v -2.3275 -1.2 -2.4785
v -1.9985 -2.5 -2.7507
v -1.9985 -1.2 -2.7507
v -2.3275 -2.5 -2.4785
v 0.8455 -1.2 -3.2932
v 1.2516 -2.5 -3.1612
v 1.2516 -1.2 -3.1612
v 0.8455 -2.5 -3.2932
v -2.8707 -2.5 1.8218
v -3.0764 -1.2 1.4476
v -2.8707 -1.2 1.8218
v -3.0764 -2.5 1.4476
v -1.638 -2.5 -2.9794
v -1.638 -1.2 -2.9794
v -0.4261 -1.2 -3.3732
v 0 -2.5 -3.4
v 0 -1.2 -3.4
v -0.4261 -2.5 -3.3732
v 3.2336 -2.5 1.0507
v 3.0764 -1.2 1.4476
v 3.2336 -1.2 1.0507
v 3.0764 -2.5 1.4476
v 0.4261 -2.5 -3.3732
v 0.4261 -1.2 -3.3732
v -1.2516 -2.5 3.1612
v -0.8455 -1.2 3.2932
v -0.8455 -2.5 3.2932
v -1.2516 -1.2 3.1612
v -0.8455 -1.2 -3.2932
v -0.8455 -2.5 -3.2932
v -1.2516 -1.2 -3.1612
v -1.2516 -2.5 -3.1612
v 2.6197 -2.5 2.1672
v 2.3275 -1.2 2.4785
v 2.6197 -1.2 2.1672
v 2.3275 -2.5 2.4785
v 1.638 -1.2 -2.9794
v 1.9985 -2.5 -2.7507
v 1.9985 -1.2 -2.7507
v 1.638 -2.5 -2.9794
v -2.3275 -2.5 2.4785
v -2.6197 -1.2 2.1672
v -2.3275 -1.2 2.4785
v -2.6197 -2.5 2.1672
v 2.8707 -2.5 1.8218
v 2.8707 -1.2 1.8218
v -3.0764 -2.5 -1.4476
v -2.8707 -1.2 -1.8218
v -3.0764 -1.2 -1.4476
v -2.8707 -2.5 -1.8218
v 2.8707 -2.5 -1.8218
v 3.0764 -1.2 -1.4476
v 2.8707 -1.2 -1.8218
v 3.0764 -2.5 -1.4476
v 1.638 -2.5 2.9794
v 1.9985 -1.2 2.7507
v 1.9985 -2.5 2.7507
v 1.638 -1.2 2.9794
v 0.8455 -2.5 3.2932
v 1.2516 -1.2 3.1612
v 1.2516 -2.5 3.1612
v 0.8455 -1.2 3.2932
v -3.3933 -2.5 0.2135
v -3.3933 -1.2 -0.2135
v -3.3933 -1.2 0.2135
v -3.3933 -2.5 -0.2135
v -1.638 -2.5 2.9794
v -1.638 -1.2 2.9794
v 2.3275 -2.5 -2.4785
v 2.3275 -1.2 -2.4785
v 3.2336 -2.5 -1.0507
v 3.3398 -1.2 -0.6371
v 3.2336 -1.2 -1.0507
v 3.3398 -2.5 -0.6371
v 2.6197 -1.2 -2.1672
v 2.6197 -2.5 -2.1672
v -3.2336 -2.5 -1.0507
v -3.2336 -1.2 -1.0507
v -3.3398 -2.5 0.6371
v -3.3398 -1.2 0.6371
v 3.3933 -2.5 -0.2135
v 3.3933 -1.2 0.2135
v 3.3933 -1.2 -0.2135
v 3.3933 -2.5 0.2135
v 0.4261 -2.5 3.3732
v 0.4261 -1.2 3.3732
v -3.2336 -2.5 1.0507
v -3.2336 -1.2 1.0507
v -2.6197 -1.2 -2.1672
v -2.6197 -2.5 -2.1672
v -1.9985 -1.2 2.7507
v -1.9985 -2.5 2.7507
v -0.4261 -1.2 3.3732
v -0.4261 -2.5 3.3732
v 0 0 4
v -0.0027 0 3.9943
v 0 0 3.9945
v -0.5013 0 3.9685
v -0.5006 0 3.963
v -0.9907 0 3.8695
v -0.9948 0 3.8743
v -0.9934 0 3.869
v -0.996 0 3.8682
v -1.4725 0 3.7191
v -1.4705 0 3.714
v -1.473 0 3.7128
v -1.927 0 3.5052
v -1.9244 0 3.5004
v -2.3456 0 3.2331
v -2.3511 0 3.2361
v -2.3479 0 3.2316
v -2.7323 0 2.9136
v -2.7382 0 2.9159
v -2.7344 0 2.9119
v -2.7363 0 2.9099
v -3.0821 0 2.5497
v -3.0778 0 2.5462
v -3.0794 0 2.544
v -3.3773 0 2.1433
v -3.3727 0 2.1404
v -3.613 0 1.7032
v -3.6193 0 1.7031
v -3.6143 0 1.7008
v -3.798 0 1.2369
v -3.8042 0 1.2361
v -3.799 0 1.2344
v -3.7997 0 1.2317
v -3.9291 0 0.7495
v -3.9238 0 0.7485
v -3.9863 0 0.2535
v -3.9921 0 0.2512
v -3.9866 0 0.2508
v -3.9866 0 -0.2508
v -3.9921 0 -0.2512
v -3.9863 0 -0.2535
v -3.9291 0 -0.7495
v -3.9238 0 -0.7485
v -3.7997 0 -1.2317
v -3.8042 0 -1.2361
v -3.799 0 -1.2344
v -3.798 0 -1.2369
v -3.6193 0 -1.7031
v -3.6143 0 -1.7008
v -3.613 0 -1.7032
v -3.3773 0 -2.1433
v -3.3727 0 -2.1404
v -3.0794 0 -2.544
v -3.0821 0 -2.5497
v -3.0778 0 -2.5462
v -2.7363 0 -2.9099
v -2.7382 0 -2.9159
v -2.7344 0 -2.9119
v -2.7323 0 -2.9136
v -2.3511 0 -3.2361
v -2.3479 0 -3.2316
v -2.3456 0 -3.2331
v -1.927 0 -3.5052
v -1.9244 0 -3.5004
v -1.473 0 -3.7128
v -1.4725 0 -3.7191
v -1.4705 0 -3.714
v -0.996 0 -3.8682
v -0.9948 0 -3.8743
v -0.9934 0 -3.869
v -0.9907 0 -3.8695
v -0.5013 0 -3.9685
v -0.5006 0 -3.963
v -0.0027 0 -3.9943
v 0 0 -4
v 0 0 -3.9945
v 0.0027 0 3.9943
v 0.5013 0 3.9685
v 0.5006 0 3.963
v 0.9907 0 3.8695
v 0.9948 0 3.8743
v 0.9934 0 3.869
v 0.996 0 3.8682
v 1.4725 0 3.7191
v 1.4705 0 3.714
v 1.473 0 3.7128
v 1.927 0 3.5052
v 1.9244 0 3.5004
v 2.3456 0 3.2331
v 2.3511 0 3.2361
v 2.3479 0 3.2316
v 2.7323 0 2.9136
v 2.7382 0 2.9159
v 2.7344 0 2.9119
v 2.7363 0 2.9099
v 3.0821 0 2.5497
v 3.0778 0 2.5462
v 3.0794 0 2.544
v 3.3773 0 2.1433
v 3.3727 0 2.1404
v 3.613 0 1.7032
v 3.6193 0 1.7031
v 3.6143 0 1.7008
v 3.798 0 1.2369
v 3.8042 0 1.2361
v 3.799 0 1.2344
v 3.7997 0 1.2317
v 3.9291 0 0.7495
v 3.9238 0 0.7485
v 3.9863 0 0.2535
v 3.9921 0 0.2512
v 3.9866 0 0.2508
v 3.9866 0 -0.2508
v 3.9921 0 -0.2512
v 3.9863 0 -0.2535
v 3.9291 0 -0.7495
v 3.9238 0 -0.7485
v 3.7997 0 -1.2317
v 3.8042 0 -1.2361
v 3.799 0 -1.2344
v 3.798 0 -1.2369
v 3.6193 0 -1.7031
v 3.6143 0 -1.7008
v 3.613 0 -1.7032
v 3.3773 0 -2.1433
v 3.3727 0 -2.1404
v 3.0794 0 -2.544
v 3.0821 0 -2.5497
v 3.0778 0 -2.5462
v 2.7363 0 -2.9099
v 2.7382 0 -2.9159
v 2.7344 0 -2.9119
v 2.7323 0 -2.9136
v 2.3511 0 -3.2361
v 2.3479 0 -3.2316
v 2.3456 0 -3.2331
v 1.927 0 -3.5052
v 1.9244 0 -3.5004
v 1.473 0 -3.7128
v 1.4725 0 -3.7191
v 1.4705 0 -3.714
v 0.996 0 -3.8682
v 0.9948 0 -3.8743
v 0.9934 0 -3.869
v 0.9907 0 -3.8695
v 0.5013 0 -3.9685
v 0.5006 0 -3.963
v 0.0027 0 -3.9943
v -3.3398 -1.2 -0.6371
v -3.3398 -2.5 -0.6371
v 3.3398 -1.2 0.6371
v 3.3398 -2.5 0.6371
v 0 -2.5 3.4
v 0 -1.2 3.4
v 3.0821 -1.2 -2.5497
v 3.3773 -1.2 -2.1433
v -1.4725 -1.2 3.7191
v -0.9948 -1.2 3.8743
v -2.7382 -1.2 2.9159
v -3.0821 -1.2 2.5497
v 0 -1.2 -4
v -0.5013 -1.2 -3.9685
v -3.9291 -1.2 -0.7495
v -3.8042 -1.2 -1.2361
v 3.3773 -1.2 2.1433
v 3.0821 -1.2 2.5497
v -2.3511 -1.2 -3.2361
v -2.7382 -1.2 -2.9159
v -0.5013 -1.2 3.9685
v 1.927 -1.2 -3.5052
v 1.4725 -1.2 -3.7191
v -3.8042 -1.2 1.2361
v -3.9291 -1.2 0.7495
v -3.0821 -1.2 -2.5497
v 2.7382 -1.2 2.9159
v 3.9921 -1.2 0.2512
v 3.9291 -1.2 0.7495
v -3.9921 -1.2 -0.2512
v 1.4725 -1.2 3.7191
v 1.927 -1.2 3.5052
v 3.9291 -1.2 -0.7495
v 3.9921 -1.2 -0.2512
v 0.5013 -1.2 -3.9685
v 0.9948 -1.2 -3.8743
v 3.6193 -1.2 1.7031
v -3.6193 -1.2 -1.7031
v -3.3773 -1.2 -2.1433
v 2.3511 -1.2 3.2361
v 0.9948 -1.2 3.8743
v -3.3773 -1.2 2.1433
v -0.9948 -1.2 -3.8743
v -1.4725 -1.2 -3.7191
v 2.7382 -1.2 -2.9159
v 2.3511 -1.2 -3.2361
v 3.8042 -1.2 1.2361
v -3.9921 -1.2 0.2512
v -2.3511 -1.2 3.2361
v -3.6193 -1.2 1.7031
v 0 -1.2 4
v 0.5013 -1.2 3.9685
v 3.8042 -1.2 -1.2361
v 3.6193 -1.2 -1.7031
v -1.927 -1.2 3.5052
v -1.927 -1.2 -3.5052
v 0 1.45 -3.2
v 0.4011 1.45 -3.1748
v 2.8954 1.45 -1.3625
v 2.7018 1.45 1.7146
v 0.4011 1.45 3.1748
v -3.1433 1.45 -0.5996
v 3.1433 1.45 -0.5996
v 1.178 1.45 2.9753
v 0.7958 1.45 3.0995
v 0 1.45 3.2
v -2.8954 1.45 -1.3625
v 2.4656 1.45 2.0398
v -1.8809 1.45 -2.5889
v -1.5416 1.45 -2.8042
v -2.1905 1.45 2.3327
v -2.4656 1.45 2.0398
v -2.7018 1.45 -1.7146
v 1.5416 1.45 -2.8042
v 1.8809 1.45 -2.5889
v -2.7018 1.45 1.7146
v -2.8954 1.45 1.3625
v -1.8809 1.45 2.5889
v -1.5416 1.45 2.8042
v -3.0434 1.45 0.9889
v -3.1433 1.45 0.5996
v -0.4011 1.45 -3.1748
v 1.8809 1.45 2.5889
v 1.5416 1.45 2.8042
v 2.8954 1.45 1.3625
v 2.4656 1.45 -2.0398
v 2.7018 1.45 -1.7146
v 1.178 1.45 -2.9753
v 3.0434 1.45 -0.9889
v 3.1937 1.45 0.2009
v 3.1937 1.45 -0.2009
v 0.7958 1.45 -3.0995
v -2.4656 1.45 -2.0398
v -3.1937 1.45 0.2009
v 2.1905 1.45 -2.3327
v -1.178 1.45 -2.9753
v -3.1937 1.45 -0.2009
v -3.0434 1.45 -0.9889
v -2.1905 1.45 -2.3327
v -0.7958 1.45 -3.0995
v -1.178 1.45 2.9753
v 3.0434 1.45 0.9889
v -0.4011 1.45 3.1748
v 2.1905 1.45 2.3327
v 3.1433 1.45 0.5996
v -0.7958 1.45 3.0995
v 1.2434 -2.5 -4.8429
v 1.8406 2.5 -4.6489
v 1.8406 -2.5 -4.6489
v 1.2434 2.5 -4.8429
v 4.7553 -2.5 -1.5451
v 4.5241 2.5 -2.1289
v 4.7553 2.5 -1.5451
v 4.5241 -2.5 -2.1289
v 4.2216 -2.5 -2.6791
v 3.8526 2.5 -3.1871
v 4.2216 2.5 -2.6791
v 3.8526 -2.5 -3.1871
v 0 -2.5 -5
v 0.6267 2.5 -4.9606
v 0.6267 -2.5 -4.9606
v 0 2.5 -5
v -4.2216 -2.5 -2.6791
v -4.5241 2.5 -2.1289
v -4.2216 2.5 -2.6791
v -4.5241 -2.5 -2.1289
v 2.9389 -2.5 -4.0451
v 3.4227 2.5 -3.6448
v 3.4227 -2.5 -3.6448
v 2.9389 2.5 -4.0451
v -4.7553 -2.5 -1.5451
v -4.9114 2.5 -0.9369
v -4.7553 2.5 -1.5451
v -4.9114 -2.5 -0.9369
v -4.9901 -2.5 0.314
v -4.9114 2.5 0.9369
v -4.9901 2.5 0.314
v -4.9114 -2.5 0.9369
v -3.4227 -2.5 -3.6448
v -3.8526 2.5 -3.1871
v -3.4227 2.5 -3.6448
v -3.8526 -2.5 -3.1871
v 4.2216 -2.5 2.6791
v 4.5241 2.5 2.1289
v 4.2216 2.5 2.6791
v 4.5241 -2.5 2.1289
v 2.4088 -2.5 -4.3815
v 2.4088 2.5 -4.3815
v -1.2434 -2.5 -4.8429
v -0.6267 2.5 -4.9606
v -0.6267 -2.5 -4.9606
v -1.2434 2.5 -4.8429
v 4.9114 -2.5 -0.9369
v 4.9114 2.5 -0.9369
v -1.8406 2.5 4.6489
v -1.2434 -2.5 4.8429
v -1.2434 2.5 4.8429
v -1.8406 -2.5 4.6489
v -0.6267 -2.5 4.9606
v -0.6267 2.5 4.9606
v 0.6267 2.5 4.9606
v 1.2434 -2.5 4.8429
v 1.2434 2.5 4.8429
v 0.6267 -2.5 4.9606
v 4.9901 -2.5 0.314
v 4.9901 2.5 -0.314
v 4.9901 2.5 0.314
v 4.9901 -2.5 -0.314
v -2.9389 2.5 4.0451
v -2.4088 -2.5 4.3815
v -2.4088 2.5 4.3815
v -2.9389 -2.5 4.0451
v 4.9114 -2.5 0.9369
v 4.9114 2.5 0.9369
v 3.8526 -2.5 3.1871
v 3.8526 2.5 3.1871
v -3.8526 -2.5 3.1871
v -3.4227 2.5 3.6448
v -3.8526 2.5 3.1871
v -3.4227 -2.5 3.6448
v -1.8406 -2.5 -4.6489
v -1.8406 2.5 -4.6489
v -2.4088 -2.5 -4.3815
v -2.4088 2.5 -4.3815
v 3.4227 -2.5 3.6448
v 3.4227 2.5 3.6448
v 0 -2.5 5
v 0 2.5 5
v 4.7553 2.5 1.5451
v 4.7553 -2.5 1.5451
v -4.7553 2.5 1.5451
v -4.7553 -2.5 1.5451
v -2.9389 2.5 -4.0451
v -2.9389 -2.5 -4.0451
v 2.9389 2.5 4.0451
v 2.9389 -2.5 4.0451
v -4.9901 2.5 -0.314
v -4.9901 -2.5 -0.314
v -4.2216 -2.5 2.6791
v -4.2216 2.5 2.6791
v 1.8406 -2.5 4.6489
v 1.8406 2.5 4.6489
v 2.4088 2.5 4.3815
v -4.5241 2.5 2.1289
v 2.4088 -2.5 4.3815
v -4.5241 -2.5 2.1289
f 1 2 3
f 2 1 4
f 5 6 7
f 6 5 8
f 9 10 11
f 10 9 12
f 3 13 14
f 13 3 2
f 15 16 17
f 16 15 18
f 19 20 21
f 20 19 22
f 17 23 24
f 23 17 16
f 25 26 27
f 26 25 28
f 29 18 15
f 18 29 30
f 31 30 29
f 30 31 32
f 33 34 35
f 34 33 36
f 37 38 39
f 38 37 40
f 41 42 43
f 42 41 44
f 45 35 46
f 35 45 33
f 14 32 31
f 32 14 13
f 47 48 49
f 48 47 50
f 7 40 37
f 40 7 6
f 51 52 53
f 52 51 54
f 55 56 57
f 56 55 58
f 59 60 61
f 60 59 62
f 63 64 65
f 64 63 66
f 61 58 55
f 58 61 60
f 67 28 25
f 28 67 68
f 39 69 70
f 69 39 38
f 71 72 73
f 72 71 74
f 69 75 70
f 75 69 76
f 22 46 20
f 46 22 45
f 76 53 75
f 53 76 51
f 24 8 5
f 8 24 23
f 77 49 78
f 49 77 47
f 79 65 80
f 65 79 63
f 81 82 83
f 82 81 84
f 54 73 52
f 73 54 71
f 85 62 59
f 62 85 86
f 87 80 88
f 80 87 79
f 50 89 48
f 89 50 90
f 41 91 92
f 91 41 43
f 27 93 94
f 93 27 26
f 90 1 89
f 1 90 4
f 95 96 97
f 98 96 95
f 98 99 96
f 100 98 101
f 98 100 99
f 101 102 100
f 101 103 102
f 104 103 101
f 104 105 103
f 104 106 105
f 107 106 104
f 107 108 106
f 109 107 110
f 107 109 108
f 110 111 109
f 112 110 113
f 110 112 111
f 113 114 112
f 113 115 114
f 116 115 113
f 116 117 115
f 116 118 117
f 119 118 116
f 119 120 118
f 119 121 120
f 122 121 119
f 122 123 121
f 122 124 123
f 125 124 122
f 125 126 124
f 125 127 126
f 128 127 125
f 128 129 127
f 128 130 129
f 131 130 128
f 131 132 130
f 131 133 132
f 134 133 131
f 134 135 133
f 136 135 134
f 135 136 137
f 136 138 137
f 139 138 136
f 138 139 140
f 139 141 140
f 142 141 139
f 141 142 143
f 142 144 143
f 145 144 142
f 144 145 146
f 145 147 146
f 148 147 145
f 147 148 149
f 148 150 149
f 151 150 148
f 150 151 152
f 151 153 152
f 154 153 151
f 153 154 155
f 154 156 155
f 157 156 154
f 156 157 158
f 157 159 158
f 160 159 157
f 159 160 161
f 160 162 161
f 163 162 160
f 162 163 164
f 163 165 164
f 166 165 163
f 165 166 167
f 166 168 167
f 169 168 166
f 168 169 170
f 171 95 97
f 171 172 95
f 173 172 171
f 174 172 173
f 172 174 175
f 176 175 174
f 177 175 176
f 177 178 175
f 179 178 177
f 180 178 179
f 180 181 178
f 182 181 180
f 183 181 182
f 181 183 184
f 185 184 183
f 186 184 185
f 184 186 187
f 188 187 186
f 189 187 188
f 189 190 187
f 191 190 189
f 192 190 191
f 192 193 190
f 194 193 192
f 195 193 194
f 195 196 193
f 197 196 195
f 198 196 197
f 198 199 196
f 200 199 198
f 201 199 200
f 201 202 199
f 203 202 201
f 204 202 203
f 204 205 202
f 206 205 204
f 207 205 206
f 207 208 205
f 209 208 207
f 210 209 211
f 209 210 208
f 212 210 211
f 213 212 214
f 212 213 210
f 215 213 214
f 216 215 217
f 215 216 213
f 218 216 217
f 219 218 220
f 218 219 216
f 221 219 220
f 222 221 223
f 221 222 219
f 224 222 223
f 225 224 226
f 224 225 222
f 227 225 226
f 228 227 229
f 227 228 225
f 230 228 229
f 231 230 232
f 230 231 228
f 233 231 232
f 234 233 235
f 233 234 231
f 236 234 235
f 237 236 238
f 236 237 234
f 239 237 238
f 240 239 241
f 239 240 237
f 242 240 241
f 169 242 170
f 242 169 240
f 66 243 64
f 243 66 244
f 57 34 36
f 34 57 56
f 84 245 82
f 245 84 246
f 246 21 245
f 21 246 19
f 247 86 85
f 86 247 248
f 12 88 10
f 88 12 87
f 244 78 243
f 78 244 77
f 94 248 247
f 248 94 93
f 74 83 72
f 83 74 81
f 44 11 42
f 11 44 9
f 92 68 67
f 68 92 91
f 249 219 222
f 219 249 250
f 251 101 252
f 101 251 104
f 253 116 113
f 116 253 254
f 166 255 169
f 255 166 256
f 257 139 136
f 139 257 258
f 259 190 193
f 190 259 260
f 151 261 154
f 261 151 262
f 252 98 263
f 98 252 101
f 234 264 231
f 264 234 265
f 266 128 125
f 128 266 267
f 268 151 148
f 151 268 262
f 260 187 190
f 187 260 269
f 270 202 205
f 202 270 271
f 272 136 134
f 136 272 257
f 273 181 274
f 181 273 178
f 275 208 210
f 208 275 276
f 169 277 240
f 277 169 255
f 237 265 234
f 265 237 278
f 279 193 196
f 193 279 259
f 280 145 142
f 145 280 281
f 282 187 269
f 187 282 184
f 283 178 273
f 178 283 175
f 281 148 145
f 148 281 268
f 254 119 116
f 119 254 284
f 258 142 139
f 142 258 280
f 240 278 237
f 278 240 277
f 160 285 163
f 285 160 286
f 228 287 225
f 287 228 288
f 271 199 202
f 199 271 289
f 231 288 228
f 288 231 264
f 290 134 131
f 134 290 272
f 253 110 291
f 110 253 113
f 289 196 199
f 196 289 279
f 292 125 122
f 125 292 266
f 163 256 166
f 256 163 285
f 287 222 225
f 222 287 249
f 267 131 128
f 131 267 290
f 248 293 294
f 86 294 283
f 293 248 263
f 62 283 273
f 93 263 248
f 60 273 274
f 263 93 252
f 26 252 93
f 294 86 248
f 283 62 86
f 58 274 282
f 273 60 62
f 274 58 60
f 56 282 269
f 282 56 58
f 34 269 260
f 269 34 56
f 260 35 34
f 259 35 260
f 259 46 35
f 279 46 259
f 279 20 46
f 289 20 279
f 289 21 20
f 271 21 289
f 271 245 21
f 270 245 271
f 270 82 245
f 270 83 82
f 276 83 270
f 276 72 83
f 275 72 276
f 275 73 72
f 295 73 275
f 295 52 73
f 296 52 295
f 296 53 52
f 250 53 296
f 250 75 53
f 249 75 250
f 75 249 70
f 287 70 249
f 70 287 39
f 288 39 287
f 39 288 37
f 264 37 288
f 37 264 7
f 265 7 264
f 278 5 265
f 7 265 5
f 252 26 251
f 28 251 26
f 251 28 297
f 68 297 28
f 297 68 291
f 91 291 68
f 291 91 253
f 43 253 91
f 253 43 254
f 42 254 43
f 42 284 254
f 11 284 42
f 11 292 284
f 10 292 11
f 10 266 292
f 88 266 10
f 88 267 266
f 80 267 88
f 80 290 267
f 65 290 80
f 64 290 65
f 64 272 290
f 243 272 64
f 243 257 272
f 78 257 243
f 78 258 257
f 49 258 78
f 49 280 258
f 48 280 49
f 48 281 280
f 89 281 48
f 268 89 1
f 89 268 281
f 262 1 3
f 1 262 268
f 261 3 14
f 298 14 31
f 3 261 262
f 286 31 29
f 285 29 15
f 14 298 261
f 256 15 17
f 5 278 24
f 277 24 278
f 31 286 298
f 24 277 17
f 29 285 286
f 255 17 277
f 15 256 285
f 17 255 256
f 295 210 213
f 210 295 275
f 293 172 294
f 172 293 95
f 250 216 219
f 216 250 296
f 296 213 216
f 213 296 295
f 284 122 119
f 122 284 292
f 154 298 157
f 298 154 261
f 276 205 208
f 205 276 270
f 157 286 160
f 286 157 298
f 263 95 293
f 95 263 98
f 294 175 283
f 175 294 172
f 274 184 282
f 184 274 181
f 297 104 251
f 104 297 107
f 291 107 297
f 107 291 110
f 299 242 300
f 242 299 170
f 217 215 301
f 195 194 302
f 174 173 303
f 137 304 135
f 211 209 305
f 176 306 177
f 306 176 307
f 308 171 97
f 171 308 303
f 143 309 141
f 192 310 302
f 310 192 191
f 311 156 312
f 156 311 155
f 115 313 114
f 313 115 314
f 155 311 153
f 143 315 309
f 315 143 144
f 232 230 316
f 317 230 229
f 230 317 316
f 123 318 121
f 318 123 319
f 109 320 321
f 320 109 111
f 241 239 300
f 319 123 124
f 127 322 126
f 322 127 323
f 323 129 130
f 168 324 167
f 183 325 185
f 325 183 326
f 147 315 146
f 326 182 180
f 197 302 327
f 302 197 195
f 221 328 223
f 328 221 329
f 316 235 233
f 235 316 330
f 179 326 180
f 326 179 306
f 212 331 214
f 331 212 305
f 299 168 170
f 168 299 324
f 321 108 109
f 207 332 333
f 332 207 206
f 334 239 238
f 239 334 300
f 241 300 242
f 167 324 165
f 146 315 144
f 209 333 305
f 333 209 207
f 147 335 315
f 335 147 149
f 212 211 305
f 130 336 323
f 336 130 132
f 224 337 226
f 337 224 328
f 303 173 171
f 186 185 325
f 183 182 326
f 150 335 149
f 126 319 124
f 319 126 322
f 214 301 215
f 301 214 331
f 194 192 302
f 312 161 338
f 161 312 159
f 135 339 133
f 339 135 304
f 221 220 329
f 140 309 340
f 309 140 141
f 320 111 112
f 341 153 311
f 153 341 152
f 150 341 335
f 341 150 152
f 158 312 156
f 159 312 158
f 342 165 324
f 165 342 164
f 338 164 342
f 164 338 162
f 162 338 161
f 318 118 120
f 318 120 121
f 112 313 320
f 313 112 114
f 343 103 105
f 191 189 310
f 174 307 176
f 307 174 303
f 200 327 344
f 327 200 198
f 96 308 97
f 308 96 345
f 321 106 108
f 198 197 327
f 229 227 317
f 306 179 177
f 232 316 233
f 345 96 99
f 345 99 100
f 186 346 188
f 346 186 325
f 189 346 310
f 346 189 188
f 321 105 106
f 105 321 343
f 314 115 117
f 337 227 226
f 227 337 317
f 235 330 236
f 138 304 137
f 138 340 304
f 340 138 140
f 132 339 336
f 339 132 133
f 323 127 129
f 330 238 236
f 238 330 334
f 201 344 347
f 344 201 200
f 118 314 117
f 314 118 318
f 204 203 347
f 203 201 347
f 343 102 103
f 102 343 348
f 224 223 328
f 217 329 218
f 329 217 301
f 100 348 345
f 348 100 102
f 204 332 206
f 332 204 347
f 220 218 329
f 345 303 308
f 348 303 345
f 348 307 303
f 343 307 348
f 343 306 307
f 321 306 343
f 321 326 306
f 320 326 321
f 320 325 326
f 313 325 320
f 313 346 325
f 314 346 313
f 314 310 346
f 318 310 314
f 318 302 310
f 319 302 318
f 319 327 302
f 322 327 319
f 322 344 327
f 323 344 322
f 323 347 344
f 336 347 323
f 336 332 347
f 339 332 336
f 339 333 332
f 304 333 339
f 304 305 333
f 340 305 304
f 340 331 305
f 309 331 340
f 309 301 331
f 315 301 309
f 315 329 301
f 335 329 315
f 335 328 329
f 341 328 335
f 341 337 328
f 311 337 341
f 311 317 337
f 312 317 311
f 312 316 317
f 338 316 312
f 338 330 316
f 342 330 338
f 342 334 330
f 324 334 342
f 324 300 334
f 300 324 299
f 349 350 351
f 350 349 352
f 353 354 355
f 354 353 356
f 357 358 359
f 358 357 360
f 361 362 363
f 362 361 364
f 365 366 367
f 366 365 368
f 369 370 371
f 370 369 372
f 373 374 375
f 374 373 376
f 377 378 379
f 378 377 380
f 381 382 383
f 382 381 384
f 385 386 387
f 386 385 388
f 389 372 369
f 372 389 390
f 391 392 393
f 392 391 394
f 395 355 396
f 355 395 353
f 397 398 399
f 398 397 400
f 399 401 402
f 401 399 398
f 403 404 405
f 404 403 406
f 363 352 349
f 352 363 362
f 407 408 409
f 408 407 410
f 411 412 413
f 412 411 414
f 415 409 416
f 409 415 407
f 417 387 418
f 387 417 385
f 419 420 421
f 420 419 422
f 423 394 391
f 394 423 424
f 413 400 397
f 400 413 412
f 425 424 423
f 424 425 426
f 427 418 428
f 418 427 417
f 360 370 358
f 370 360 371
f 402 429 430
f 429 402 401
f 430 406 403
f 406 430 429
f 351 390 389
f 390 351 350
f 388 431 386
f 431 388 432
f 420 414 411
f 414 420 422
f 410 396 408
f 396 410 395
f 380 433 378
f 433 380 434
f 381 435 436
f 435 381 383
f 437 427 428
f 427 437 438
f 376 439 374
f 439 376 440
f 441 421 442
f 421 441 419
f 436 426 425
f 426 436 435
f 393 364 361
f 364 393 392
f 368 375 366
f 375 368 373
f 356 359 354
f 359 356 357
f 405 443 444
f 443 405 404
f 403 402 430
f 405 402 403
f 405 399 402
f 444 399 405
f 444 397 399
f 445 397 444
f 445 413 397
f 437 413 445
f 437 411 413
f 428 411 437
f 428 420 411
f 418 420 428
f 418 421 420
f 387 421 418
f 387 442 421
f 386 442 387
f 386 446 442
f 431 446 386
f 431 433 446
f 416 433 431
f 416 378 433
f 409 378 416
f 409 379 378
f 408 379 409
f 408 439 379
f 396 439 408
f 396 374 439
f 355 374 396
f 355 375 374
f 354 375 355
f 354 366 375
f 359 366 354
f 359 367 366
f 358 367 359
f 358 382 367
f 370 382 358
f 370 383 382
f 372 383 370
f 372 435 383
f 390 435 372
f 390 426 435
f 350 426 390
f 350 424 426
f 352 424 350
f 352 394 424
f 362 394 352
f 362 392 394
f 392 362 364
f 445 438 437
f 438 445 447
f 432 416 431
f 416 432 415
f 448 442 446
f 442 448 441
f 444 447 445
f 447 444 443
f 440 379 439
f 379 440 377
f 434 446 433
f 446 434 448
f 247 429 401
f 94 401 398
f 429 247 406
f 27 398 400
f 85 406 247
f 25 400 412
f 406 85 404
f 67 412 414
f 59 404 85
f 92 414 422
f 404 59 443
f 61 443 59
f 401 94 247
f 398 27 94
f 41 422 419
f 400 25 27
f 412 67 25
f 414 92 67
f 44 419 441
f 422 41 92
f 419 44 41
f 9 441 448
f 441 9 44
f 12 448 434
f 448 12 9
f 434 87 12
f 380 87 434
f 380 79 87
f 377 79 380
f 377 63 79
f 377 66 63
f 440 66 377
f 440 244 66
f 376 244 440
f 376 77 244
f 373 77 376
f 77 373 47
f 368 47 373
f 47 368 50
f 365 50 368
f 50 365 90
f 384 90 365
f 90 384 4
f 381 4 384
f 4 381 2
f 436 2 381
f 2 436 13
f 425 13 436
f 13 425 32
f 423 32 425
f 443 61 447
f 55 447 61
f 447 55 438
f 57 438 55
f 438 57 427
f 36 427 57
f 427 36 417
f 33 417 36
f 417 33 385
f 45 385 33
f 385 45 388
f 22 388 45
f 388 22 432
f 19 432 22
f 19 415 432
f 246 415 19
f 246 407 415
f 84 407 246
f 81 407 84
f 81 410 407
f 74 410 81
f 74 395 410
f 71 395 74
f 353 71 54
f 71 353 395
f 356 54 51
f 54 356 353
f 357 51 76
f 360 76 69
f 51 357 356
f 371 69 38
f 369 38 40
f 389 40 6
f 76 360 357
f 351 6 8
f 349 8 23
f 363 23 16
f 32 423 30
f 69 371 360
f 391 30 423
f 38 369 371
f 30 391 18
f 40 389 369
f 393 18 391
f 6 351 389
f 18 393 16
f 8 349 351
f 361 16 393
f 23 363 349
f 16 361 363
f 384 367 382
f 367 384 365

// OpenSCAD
module new_wheel() {
    difference() {
        rotate([90,90,0]) cylinder(h=5, r1=5, r2=5, $fn=50, center=true);
        union(){
        color("gray") rotate([90,90,0]) cylinder(h=5, r1=3.4, r2=3.4, $fn=50);
        rotate([90,90,0]) cylinder(h=1.2, r1=4, r2=4, $fn=50);
        color("red") translate([0,1.45,0]) rotate([90,90,0]) cylinder(h=1.46, r1=3.2, r2=4, $fn=50);
        }
        // translate([0, 0, -5]) {
        //     cube(size=[10, 10, 10], center=true);
        // } 
    }   
}

new_wheel();
